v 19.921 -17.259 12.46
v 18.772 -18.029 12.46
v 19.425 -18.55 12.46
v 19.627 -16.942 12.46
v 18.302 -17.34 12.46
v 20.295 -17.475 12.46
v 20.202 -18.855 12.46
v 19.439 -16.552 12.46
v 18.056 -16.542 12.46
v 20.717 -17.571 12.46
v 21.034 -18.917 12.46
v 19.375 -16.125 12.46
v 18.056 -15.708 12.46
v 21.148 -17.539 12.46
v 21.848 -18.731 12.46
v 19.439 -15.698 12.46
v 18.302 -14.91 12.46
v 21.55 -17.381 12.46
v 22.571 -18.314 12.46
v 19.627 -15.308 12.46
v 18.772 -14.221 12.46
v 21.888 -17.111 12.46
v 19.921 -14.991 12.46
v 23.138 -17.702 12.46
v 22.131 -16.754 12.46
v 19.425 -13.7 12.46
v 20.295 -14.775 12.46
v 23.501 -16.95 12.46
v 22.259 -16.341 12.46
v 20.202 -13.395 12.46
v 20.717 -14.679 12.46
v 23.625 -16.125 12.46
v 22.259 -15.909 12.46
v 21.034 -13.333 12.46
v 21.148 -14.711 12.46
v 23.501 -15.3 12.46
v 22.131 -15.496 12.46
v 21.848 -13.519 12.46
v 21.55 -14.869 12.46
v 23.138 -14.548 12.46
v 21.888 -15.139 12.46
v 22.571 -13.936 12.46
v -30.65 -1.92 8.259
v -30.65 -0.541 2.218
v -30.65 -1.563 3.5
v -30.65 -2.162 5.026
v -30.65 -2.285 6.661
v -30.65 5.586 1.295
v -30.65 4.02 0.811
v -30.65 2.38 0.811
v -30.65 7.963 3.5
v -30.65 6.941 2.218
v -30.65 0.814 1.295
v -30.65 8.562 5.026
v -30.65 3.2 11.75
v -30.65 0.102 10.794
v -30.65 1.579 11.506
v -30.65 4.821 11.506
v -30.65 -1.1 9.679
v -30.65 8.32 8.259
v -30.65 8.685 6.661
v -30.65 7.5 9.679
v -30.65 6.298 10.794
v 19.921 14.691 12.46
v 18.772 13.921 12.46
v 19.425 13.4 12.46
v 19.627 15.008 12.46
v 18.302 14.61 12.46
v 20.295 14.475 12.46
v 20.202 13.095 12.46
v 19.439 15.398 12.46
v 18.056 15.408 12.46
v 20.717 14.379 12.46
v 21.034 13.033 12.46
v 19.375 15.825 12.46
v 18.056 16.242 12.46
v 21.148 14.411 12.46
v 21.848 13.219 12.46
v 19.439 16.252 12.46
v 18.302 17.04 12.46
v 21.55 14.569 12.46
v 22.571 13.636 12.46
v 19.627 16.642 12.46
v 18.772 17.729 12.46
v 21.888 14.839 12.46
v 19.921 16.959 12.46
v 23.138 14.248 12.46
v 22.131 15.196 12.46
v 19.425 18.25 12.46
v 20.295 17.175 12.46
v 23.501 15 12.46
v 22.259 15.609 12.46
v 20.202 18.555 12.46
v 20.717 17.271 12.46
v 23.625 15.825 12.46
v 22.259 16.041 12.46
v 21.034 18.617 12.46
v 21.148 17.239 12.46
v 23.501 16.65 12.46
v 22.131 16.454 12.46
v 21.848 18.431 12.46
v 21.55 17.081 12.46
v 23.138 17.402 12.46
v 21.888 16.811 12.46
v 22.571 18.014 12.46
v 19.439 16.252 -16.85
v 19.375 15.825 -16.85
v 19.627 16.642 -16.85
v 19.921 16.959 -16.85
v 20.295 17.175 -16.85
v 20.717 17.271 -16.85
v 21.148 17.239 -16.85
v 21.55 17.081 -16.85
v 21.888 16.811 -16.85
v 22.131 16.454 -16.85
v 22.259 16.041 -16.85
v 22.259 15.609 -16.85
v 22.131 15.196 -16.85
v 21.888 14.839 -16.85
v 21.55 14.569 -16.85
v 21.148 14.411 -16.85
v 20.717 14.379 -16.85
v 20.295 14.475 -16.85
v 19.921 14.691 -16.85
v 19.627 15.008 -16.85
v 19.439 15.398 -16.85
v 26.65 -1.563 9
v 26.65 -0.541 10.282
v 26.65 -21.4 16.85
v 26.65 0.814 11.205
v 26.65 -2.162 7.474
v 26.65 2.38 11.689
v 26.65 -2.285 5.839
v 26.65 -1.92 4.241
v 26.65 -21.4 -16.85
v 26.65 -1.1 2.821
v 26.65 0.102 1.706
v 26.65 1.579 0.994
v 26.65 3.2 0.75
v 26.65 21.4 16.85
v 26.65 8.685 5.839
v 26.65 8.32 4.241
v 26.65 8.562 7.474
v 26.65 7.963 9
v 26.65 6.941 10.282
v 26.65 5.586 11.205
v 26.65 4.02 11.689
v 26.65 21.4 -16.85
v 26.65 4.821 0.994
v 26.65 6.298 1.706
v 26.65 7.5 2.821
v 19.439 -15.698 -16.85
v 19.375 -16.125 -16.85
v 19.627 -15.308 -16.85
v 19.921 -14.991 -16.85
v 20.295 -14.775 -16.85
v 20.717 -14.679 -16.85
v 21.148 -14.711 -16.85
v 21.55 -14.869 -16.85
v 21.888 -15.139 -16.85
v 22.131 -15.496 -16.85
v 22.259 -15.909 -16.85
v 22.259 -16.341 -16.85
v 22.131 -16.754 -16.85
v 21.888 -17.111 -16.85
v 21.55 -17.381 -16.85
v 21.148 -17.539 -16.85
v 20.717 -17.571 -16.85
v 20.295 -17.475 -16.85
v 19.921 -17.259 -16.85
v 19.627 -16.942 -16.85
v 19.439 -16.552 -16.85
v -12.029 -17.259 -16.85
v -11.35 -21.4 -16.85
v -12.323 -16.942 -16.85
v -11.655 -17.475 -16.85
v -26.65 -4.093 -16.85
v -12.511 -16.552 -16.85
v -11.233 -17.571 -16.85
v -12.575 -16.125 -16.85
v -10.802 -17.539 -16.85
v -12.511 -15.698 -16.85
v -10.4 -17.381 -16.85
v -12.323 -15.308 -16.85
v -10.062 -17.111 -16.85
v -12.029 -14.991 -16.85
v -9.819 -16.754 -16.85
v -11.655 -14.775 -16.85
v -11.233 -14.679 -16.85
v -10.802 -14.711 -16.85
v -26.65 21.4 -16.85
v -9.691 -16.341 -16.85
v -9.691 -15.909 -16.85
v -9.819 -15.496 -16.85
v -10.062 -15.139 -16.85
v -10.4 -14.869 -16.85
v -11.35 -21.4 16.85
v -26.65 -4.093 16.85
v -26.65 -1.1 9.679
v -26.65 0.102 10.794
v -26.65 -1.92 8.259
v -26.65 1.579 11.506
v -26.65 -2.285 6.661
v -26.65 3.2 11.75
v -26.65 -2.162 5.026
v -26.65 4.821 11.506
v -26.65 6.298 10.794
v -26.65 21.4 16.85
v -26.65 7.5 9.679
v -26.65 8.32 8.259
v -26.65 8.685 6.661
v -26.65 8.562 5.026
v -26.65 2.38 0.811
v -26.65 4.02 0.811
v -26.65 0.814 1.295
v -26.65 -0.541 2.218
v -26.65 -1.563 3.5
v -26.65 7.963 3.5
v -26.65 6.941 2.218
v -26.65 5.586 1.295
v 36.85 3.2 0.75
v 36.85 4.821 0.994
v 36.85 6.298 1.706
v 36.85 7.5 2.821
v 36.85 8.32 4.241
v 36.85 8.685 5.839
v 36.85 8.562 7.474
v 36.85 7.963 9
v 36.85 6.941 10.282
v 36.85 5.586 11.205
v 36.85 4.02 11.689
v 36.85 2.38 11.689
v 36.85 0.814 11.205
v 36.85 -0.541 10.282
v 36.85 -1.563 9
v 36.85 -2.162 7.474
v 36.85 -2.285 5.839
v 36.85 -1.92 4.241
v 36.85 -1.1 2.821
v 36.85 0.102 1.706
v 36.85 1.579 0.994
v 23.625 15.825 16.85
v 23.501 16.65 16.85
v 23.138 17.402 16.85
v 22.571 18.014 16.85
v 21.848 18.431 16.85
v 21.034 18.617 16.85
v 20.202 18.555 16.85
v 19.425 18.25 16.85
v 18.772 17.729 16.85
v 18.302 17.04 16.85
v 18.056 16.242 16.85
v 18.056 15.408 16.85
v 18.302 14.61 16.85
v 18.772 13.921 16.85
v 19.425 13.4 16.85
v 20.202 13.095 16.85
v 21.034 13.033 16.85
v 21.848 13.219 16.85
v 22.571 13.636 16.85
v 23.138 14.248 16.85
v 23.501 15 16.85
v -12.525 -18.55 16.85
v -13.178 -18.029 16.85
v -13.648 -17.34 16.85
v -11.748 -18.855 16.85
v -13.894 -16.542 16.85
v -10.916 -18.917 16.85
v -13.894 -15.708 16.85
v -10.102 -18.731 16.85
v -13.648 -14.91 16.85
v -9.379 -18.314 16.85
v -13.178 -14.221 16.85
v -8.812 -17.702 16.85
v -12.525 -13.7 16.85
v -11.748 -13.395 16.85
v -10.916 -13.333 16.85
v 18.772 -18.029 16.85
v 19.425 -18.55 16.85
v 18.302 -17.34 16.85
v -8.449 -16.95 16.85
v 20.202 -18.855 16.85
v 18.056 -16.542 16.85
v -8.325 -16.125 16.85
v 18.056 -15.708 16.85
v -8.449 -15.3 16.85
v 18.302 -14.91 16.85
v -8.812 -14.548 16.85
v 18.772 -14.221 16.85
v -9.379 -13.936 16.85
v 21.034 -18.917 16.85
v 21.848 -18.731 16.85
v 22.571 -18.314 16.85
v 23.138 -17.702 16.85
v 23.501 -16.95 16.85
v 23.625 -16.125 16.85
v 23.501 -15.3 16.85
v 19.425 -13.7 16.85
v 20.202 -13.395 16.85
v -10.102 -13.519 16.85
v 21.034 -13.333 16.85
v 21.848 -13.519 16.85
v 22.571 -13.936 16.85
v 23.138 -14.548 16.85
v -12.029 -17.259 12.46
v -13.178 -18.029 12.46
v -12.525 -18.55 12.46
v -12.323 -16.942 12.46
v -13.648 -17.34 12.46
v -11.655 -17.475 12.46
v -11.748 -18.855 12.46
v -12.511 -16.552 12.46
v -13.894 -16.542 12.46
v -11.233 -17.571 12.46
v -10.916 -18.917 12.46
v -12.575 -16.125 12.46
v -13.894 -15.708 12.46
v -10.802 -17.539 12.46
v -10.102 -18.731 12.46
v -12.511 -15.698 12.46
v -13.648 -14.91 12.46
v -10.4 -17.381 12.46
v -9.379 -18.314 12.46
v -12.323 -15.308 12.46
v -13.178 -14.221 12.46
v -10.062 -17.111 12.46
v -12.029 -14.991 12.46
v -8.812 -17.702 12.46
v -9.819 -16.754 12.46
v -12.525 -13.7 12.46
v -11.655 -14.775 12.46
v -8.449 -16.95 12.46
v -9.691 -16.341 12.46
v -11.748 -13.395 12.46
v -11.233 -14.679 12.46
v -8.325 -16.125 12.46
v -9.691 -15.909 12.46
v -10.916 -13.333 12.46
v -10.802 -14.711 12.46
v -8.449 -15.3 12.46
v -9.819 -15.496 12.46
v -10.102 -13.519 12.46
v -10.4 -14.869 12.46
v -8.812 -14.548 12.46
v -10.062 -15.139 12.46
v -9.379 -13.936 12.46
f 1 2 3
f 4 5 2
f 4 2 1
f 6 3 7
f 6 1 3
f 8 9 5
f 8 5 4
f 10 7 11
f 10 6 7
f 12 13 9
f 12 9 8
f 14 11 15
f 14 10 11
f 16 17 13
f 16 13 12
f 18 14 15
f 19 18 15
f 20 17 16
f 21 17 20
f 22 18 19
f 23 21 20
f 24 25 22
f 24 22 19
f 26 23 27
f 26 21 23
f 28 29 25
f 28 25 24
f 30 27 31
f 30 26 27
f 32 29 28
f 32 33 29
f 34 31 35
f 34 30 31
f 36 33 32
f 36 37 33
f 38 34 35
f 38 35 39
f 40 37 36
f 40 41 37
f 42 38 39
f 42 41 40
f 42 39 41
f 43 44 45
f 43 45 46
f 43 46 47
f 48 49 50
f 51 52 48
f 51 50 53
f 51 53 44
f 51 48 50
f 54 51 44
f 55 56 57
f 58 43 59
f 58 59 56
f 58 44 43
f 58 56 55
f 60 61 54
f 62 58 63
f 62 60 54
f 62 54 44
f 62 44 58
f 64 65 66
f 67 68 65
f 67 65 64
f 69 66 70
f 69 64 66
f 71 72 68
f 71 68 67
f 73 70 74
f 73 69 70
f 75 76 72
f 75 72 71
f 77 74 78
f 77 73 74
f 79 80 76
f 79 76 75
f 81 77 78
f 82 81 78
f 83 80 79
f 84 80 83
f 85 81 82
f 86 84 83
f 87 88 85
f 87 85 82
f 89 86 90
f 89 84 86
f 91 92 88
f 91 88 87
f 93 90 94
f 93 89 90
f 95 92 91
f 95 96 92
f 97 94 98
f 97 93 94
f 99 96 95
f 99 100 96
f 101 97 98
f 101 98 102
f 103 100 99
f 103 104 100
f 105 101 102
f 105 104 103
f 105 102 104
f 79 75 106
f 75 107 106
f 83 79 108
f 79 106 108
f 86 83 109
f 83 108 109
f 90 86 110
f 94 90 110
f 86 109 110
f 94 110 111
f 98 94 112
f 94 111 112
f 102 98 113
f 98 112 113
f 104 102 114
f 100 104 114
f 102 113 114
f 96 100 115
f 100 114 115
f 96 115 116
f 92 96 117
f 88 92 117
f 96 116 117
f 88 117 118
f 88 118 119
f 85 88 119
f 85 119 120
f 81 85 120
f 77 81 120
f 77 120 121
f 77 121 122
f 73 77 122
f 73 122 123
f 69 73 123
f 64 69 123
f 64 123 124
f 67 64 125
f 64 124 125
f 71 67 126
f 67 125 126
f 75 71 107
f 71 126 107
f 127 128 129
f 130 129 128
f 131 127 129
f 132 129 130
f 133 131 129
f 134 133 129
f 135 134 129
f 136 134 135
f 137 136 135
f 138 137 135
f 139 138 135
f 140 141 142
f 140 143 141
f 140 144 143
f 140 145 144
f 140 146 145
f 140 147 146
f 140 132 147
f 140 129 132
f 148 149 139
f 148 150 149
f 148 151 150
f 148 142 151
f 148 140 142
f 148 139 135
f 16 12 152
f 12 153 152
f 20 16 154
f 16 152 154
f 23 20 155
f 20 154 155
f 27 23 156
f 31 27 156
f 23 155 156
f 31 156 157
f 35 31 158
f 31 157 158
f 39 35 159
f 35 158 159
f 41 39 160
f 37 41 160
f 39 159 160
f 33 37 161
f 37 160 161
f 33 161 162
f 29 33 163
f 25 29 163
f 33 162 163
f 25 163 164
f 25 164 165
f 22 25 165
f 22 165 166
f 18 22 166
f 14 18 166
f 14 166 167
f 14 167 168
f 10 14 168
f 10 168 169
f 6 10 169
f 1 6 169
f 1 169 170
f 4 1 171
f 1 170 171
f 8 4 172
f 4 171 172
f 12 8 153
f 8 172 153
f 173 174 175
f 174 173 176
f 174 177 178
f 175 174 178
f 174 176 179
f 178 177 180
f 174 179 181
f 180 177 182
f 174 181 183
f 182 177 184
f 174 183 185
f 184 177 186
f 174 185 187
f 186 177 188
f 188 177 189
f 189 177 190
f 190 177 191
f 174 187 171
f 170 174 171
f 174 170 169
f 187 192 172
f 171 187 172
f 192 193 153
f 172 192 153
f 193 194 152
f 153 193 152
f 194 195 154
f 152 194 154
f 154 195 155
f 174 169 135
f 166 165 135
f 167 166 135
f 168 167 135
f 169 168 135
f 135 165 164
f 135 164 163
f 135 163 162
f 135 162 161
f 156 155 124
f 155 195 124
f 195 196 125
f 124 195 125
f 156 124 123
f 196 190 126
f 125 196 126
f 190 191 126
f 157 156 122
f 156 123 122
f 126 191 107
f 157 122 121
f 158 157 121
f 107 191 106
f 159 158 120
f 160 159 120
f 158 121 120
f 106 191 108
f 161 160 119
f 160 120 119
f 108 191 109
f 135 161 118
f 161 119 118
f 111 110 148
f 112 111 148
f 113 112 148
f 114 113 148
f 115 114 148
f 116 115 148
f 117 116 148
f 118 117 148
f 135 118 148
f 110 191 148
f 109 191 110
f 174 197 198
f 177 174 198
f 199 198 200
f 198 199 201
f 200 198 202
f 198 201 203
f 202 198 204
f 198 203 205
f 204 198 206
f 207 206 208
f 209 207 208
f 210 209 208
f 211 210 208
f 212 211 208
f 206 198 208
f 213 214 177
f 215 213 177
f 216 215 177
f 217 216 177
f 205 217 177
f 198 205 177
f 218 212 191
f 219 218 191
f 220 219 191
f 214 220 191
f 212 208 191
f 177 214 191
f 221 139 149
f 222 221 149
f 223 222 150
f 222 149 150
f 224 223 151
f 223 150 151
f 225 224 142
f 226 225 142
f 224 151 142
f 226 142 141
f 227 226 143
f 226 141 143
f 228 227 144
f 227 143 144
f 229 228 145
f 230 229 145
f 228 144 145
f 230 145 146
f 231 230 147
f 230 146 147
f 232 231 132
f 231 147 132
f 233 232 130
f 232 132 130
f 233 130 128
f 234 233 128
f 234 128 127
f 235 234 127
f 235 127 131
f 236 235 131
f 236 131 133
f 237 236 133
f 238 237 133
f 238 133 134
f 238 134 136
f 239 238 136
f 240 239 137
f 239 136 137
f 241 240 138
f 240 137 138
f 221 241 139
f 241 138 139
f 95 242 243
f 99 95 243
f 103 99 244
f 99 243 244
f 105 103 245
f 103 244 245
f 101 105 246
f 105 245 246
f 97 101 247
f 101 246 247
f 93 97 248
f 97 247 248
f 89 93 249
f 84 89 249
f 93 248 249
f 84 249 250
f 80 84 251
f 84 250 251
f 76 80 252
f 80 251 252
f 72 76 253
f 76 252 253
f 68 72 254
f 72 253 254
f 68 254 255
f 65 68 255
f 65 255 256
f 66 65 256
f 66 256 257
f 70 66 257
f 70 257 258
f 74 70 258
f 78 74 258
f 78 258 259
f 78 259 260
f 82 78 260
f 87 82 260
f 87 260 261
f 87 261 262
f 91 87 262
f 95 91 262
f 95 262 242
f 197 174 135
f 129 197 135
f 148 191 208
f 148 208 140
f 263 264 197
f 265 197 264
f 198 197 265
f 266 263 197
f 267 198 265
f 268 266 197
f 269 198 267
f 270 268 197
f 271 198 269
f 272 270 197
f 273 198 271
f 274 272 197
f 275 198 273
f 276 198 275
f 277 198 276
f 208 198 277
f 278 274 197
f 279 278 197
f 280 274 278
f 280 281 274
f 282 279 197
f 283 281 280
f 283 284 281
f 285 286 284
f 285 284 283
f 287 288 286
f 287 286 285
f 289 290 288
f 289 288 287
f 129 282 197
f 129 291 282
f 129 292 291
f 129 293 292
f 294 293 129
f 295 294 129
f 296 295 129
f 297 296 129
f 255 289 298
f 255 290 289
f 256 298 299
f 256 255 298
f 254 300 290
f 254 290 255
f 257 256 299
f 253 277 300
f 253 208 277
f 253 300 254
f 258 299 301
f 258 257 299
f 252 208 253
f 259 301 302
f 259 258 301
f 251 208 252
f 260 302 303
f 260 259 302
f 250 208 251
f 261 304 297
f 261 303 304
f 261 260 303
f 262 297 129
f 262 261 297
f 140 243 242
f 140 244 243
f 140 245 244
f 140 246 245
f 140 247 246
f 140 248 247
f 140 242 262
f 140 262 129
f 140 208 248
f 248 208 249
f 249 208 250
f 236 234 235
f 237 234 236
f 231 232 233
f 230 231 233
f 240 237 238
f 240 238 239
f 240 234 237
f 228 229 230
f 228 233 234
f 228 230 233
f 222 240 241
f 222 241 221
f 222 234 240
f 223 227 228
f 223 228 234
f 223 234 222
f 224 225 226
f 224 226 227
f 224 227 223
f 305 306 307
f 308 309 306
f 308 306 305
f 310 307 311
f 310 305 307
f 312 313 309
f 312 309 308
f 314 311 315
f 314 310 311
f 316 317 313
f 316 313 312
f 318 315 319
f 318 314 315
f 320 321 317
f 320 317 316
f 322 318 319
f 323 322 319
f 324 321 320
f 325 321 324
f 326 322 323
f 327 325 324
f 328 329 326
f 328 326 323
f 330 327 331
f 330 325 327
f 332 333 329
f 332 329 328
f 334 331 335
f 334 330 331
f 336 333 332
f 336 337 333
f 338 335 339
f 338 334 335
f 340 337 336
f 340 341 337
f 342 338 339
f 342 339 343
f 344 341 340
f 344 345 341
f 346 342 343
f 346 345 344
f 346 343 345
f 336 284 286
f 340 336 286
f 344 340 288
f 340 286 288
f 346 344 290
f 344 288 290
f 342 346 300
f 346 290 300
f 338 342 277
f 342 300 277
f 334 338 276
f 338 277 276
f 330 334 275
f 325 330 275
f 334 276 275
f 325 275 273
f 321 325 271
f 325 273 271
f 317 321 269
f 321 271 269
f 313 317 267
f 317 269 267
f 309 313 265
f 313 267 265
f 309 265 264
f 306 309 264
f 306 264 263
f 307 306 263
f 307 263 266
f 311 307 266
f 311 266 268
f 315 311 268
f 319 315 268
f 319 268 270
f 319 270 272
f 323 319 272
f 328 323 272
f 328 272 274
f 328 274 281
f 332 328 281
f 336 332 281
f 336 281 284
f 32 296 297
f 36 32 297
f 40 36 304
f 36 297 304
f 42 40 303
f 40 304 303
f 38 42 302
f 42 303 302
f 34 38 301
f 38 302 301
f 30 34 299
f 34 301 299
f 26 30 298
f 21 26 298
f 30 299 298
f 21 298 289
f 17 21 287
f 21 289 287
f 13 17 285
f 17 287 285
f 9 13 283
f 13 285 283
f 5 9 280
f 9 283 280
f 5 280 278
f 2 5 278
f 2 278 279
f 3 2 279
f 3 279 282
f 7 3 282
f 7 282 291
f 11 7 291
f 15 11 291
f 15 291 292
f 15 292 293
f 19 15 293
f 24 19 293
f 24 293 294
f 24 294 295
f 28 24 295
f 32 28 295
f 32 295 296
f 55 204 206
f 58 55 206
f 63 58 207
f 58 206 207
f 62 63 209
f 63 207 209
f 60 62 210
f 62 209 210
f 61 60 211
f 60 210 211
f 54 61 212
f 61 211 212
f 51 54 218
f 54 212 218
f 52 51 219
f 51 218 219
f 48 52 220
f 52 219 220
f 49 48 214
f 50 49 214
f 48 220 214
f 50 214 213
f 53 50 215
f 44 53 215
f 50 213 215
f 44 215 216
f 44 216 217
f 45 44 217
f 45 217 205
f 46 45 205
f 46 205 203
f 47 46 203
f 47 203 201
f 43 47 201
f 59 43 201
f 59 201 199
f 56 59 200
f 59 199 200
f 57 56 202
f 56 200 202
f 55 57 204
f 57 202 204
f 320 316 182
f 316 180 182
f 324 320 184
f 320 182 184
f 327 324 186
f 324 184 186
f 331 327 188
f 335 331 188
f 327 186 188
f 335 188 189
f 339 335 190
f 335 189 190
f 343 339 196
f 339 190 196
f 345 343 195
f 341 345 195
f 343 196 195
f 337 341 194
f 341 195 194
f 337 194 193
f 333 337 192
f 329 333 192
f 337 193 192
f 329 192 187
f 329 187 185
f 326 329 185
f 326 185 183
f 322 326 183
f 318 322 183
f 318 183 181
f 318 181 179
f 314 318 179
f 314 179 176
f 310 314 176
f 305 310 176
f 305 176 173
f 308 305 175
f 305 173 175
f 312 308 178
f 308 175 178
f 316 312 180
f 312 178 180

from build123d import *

# Parameters (mm, degrees)
ESBO_O1_W                                            = 53.3
ESBO_O1_H                                            = 33.7
RESSALTO_EXTRUS_O1_DEPTH                             = 21.4
CORTE_EXTRUS_O1_DEPTH                                = 34.7
ESBO_O3_R                                            = 5.5
RESSALTO_EXTRUS_O2_DEPTH                             = 10.2
ESBO_O4_R                                            = 5.5
RESSALTO_EXTRUS_O3_DEPTH                             = 4
REBAIXO_PARA_PARAFUSO_DE_M_QUINA_COM_CAB_D           = 2.9
REBAIXO_PARA_PARAFUSO_DE_M_QUINA_COM_CAB_CBORE_D     = 5.6
REBAIXO_PARA_PARAFUSO_DE_M_QUINA_COM_CAB_CBORE_DEPTH = 4.39


with BuildPart() as part:
    # Esboço1 → Ressalto-extrusão1 (new body, symmetric)
    with BuildSketch(Plane(origin=(0, 0, 0), x_dir=(1, 0, 0), z_dir=(0, 1, 0))):
        Rectangle(ESBO_O1_W, ESBO_O1_H)
    extrude(amount=RESSALTO_EXTRUS_O1_DEPTH, both=True)

    # Esboço2 → Corte-extrusão1 (cut, through all)
    with BuildSketch(Plane.XY.offset(16.85)):
        Polygon((-26.65, -21.4), (-11.35, -21.4), (-26.65, -4.093353878), align=None)
    extrude(amount=-CORTE_EXTRUS_O1_DEPTH, mode=Mode.SUBTRACT)

    # Esboço3 → Ressalto-extrusão2 (add)
    with BuildSketch(Plane(origin=(26.65, 0, 0), x_dir=(0, 0, -1), z_dir=(1, 0, 0))):
        with Locations((-6.25, 3.2)):
            Circle(ESBO_O3_R)
    extrude(amount=RESSALTO_EXTRUS_O2_DEPTH)

    # Esboço4 → Ressalto-extrusão3 (add)
    with BuildSketch(Plane.ZY.offset(26.65)):
        with Locations((6.25, 3.2)):
            Circle(ESBO_O4_R)
    extrude(amount=RESSALTO_EXTRUS_O3_DEPTH)

    # Rebaixo para parafuso de máquina com cabeça panela de M31 (through all)
    with Locations(Plane.XY.offset(16.85)):
        with Locations((20.825, 15.825), (20.825, -16.125), (-11.125, -16.125)):
            CounterBoreHole(REBAIXO_PARA_PARAFUSO_DE_M_QUINA_COM_CAB_D / 2, REBAIXO_PARA_PARAFUSO_DE_M_QUINA_COM_CAB_CBORE_D / 2, REBAIXO_PARA_PARAFUSO_DE_M_QUINA_COM_CAB_CBORE_DEPTH)


solid = part.part
